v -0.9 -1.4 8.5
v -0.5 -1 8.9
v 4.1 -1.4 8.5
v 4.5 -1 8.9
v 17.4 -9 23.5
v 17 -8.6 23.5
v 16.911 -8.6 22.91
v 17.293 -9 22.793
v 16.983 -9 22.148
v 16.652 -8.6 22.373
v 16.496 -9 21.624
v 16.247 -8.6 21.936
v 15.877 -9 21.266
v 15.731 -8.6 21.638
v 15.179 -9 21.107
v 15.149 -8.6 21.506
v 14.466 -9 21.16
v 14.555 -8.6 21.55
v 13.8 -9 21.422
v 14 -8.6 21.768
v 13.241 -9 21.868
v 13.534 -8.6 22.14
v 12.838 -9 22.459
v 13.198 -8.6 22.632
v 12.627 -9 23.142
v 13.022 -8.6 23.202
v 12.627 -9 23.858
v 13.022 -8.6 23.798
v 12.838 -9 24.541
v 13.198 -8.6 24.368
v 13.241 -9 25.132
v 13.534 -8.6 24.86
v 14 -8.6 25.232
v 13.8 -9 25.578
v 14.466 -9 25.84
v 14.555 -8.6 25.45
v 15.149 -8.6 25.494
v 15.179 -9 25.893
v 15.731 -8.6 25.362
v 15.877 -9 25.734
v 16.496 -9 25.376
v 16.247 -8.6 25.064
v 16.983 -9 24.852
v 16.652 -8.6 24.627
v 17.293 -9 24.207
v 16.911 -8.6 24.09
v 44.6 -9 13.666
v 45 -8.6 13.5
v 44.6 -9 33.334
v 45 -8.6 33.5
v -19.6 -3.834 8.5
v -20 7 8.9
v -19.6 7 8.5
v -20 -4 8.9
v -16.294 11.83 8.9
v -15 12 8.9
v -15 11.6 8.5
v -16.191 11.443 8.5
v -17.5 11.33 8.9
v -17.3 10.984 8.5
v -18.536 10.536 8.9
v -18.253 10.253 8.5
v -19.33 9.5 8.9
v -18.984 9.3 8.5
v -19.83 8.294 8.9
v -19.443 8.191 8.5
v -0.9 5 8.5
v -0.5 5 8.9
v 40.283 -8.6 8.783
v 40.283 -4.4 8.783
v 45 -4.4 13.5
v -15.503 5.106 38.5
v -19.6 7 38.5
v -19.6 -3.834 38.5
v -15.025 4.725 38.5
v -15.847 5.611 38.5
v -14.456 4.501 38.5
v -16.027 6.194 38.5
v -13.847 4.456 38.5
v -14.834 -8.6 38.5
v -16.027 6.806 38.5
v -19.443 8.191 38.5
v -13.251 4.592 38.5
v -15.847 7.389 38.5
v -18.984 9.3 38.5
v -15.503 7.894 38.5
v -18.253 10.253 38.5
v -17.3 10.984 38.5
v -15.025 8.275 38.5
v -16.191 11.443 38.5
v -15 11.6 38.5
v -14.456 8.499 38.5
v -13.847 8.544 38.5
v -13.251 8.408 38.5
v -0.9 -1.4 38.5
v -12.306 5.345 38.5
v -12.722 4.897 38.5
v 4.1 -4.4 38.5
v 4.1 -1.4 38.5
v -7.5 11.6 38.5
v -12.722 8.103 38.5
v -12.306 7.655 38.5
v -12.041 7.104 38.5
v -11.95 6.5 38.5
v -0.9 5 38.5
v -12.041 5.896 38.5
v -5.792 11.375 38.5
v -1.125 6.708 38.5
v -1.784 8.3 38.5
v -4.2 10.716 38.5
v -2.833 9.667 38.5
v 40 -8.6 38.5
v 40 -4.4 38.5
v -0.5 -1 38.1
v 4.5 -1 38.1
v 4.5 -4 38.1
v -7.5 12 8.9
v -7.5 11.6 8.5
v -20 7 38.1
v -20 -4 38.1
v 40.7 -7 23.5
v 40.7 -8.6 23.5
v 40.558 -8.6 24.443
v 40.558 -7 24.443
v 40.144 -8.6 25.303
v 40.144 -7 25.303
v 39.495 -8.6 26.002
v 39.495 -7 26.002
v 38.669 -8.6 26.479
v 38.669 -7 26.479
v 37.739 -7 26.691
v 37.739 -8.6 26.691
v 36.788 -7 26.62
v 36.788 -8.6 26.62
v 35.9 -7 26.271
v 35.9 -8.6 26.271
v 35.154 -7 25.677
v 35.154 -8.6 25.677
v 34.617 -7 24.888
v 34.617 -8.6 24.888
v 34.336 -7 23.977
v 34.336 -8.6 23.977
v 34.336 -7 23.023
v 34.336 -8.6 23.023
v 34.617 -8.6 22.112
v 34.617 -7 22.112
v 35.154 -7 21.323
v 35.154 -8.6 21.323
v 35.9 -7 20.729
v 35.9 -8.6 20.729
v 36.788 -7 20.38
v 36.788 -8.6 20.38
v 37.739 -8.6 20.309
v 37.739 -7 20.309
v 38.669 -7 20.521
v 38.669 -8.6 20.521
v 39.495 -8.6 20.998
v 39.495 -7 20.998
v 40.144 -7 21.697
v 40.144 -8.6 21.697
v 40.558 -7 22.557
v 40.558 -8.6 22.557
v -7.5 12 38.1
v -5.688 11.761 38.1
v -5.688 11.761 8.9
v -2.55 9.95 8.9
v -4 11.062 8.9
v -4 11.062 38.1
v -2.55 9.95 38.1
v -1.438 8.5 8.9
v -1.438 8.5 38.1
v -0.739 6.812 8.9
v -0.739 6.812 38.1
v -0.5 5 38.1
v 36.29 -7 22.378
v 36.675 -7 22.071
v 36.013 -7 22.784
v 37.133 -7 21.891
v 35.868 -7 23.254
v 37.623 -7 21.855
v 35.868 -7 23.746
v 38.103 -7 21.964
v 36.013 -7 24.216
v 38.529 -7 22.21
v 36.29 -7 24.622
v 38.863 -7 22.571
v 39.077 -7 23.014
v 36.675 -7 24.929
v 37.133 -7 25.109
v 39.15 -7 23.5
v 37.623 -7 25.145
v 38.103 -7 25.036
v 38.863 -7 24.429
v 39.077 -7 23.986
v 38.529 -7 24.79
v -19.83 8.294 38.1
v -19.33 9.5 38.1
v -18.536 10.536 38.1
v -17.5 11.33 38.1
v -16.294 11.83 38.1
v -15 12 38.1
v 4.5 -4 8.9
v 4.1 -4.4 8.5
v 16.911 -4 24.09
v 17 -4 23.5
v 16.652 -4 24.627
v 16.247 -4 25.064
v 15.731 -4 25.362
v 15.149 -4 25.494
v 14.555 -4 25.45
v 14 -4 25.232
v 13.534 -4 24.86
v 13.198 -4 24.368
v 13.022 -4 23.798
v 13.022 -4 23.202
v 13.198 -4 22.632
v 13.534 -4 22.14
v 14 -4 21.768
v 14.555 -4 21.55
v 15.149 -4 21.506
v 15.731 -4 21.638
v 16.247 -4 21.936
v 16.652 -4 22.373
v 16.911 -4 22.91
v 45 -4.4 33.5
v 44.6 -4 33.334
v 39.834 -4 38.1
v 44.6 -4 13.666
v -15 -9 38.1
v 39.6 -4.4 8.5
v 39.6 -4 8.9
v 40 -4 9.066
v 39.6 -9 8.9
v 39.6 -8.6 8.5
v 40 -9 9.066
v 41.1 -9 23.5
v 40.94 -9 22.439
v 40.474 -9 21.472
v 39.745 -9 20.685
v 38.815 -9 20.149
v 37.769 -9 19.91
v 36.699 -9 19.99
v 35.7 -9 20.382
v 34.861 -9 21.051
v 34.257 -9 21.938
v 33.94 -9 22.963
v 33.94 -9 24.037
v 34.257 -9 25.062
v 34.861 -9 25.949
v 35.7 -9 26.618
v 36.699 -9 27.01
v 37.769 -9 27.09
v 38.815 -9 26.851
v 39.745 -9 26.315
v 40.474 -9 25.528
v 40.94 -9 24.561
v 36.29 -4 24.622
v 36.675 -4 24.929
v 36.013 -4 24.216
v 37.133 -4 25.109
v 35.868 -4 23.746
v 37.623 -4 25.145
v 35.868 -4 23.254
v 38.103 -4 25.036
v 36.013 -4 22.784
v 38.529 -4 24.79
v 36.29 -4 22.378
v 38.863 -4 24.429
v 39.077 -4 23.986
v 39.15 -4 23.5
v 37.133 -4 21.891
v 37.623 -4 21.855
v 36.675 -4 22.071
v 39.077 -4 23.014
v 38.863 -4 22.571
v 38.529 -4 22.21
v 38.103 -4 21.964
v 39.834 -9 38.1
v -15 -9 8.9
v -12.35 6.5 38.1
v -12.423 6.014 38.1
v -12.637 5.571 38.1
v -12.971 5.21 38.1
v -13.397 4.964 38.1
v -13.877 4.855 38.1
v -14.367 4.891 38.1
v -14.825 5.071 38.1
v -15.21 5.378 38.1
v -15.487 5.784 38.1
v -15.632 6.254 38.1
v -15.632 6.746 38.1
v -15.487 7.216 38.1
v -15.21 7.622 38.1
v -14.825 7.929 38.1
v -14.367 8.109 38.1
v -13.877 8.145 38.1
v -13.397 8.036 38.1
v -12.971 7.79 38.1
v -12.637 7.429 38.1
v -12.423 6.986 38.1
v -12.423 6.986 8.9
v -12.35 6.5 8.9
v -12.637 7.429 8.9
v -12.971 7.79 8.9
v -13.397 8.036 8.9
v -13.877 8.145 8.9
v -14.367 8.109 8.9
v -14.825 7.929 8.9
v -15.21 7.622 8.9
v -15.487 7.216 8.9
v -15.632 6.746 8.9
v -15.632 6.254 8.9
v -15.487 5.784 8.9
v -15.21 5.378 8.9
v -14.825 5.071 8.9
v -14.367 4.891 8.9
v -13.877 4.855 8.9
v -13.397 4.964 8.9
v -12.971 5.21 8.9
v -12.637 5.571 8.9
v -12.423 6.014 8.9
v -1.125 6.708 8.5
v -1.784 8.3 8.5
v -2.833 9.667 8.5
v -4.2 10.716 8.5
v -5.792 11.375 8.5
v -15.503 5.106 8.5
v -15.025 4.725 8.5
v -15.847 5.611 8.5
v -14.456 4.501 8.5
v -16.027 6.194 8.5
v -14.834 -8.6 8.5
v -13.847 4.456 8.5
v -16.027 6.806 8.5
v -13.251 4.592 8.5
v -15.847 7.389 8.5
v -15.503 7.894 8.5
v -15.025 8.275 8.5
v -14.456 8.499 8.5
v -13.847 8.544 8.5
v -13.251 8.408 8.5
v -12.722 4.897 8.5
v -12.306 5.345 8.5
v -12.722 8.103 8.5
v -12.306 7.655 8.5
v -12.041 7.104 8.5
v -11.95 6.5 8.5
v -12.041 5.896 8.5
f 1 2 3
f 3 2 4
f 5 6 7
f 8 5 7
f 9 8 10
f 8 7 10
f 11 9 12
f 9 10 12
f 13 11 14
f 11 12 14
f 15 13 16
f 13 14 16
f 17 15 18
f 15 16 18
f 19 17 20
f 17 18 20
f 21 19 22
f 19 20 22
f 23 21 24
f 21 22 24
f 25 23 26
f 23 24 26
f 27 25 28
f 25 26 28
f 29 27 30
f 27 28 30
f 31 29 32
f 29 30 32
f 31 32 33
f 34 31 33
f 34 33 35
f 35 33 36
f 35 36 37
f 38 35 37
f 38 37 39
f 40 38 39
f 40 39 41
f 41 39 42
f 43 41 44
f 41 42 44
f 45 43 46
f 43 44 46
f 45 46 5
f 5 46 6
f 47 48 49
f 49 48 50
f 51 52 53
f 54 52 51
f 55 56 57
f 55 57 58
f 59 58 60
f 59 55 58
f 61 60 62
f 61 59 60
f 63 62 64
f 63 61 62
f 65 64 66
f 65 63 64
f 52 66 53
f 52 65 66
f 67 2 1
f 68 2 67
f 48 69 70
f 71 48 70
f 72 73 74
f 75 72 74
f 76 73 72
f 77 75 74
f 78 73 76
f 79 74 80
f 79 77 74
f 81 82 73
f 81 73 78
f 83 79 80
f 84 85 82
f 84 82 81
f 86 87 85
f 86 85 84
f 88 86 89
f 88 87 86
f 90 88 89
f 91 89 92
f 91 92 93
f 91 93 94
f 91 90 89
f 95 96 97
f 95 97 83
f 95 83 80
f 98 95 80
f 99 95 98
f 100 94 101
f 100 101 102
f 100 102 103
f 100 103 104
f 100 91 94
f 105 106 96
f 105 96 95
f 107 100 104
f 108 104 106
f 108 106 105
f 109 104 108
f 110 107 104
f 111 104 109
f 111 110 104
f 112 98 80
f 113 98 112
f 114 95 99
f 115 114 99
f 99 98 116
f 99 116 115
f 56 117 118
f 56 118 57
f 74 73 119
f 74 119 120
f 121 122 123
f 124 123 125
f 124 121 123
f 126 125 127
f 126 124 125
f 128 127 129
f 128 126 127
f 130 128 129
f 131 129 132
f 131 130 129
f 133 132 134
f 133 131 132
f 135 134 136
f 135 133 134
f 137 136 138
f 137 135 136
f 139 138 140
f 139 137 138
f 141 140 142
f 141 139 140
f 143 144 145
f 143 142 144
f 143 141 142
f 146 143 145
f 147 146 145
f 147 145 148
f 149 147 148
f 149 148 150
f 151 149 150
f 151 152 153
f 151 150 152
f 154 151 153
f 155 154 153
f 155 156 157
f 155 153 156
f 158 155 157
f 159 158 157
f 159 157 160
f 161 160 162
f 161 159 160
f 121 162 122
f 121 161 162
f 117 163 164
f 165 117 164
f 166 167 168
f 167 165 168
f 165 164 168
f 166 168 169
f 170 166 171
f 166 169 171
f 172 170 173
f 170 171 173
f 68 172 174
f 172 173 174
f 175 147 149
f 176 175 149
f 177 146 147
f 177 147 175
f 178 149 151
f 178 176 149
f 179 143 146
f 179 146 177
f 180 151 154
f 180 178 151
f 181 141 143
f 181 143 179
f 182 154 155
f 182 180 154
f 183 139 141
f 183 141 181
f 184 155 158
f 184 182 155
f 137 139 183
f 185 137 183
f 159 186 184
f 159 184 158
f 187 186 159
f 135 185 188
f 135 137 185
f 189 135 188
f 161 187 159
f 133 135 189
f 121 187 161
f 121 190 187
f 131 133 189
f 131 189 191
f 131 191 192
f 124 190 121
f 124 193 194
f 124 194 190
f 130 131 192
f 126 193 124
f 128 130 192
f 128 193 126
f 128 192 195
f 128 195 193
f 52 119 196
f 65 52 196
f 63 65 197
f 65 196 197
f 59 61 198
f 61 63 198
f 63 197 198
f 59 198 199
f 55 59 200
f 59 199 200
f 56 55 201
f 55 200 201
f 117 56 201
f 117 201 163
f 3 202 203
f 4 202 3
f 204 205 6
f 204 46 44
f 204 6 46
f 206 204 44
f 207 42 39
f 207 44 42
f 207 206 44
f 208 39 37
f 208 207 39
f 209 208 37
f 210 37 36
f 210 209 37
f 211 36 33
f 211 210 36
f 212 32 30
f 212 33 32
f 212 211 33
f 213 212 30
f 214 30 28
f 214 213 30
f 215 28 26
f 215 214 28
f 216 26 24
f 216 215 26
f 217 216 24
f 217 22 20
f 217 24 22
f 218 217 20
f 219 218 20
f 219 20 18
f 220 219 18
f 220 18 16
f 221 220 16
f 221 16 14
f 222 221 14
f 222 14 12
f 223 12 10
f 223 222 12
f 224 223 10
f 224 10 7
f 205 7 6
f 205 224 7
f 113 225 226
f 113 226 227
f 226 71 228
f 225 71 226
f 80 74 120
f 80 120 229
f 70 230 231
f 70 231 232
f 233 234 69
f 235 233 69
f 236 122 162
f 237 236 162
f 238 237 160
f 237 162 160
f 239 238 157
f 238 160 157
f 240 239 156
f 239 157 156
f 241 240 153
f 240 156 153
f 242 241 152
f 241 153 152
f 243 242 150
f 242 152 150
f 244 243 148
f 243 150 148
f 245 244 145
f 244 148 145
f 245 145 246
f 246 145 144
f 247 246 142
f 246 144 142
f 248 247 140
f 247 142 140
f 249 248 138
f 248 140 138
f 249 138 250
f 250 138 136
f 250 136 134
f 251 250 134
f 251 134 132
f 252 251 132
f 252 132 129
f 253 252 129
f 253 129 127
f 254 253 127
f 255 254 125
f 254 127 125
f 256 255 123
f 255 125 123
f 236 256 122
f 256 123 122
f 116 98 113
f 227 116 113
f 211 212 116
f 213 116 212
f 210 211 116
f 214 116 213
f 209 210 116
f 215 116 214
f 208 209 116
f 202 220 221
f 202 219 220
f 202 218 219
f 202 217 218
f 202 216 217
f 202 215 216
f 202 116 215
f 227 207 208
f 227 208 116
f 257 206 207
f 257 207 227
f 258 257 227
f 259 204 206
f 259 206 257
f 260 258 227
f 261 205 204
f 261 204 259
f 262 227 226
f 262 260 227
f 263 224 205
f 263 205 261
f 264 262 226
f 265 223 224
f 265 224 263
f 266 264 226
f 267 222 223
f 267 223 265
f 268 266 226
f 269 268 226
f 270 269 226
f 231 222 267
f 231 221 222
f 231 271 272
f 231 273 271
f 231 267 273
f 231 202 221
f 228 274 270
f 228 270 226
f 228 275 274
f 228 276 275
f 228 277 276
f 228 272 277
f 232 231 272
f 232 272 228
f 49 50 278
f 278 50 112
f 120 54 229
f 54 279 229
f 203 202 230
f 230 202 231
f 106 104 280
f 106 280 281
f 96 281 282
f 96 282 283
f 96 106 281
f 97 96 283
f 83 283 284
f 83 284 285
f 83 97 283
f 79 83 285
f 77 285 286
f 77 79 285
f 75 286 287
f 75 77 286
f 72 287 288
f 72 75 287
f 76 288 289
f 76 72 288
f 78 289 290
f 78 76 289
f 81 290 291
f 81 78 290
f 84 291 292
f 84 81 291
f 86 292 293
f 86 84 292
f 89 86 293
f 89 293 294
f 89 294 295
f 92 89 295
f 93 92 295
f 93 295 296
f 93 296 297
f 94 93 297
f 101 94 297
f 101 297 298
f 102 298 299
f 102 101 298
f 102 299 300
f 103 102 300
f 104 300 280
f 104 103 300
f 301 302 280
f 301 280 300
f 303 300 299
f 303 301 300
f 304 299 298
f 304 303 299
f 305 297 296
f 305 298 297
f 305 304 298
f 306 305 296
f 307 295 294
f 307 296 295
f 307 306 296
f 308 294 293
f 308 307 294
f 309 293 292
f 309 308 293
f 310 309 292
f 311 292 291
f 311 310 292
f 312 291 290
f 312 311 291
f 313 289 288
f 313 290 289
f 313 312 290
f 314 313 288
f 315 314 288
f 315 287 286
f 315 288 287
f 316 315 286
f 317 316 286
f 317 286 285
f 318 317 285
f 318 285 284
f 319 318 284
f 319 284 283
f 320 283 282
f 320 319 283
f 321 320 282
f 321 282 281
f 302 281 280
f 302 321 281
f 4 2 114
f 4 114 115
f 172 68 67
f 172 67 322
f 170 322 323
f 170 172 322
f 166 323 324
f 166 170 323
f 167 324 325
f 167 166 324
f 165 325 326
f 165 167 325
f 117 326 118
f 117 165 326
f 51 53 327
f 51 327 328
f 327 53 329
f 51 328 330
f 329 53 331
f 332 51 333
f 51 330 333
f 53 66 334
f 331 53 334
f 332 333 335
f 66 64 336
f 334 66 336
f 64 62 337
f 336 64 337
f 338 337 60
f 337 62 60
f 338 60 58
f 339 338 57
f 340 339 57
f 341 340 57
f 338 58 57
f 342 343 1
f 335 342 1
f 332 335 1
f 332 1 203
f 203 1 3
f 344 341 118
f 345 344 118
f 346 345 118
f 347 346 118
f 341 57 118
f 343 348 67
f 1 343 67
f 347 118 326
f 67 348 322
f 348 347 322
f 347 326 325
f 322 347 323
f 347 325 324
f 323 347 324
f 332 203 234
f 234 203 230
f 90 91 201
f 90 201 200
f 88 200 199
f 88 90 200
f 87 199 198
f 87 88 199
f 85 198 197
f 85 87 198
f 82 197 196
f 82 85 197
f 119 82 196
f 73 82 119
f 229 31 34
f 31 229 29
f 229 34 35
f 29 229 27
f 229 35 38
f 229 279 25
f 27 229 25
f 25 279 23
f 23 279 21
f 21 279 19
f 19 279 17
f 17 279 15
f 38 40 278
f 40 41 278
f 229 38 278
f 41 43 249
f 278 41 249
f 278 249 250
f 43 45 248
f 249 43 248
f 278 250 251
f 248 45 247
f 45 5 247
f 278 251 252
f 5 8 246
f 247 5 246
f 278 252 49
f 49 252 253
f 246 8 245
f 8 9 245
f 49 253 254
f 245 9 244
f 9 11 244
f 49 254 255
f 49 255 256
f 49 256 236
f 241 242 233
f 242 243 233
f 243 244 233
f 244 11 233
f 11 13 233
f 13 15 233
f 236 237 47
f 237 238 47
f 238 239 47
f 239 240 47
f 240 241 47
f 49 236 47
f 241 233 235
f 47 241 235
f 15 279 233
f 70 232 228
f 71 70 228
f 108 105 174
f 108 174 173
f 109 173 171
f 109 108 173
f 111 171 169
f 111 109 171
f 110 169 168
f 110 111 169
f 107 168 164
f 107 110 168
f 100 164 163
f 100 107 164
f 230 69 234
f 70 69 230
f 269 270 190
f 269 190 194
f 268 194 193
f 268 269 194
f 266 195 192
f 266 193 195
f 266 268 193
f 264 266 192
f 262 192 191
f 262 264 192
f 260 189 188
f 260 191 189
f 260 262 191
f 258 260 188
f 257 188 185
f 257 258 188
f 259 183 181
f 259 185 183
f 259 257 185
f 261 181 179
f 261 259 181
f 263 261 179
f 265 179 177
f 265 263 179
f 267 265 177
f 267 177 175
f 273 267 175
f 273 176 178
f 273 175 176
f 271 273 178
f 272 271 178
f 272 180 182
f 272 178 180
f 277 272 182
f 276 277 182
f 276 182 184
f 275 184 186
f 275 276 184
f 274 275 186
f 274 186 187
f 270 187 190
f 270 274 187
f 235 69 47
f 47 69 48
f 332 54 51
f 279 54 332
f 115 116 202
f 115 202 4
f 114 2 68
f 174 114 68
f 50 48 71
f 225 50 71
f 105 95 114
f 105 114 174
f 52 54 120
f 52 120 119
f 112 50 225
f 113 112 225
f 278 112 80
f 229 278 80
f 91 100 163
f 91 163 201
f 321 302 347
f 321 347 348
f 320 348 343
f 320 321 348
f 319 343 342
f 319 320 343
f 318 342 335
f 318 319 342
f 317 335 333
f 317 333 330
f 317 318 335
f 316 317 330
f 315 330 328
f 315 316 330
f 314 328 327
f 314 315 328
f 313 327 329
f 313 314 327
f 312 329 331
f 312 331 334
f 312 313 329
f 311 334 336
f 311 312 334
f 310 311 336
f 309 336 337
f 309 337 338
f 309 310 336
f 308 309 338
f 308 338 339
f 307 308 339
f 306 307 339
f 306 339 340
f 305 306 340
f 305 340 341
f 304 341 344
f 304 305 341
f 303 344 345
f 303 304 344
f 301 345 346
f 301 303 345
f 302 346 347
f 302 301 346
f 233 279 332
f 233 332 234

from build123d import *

# Parameters (mm, degrees)
CYLINDER008_R      = 1.65
CYLINDER008_DEPTH  = 10
CYLINDER009_R      = 3.2
CYLINDER009_DEPTH  = 10
CYLINDER007_R      = 2
CYLINDER007_DEPTH  = 10
CYLINDER006_R      = 1.65
CYLINDER006_DEPTH  = 50
BOX014_W           = 5
BOX014_H           = 3
BOX014_DEPTH       = 30
BOX012_W           = 19.5
BOX012_H           = 21
BOX012_DEPTH       = 30
BOX011_W           = 59
BOX011_H           = 5
BOX011_DEPTH       = 30
FILLET001_R        = 5
FILLET002_R        = 7
CHAMFER006004_SIZE = 5
CHAMFER006005_SIZE = 5
CHAMFER006006_SIZE = 0.4


with BuildPart() as cylinder008:
    # Cylinder008 → Cylinder008 (new body)
    with BuildSketch(Plane(origin=(37.5, 0, 23.5), x_dir=(1, 0, 0), z_dir=(0, -1, 0))):
        Circle(CYLINDER008_R)
    extrude(amount=CYLINDER008_DEPTH)


with BuildPart() as fusion004:
    # Cylinder009 → Cylinder009 (new body)
    with BuildSketch(Plane(origin=(37.5, -7, 23.5), x_dir=(1, 0, 0), z_dir=(0, -1, 0))):
        Circle(CYLINDER009_R)
    extrude(amount=CYLINDER009_DEPTH)

    # Fusion004: union Cylinder008
    add(cylinder008.part)


with BuildPart() as cylinder007:
    # Cylinder007 → Cylinder007 (new body)
    with BuildSketch(Plane(origin=(15, 0, 23.5), x_dir=(1, 0, 0), z_dir=(0, -1, 0))):
        Circle(CYLINDER007_R)
    extrude(amount=CYLINDER007_DEPTH)


with BuildPart() as cylinder006:
    # Cylinder006 → Cylinder006 (new body)
    with BuildSketch(Plane(origin=(-14, 6.5, -4), x_dir=(1, 0, 0), z_dir=(0, 0, 1))):
        Circle(CYLINDER006_R)
    extrude(amount=CYLINDER006_DEPTH)


with BuildPart() as cube013:
    # Box014 → Box014 (new body)
    with BuildSketch(Plane(origin=(-0.5, -4, 8.5), x_dir=(1, 0, 0), z_dir=(0, 0, 1))):
        with Locations((2.5, 1.5)):
            Rectangle(BOX014_W, BOX014_H)
    extrude(amount=BOX014_DEPTH)


with BuildPart() as cube012:
    # Box012 → Box012 (new body)
    with BuildSketch(Plane(origin=(-20, -9, 8.5), x_dir=(1, 0, 0), z_dir=(0, 0, 1))):
        with Locations((9.75, 10.5)):
            Rectangle(BOX012_W, BOX012_H)
    extrude(amount=BOX012_DEPTH)


with BuildPart() as chamfer006006:
    # Box011 → Box011 (new body)
    with BuildSketch(Plane(origin=(-14, -9, 8.5), x_dir=(1, 0, 0), z_dir=(0, 0, 1))):
        with Locations((29.5, 2.5)):
            Rectangle(BOX011_W, BOX011_H)
    extrude(amount=BOX011_DEPTH)

    # Fusion003: union Cube013, Cube012
    add(cube013.part)
    add(cube012.part)

    # Cut010011008009003016026008003006: cut Cylinder006
    add(cylinder006.part, mode=Mode.SUBTRACT)

    # Fillet001
    fillet001_edges = [chamfer006006.edges().sort_by_distance(p)[0] for p in [
        (-20, 12, 23.5),
    ]]
    fillet(fillet001_edges, radius=FILLET001_R)

    # Fillet002
    fillet002_edges = [chamfer006006.edges().sort_by_distance(p)[0] for p in [
        (-0.5, 12, 23.5),
    ]]
    fillet(fillet002_edges, radius=FILLET002_R)

    # Chamfer006004
    chamfer006004_edges = [chamfer006006.edges().sort_by_distance(p)[0] for p in [
        (-20, -9, 23.5),
    ]]
    chamfer(chamfer006004_edges, length=CHAMFER006004_SIZE)

    # Chamfer006005
    chamfer006005_edges = [chamfer006006.edges().sort_by_distance(p)[0] for p in [
        (45, -6.5, 8.5),
        (45, -6.5, 38.5),
    ]]
    chamfer(chamfer006005_edges, length=CHAMFER006005_SIZE)

    # Cut010011008009003016026008003007: cut Cylinder007
    add(cylinder007.part, mode=Mode.SUBTRACT)

    # Cut010011008009003016026008003008: cut Fusion004
    add(fusion004.part, mode=Mode.SUBTRACT)

    # Chamfer006006
    chamfer006006_edges = [chamfer006006.edges().sort_by_distance(p)[0] for p in [
        (34.3, -9, 23.5),
        (22.25, -4, 8.5),
        (42.5, -4, 11),
        (45, -4, 23.5),
        (22.25, -4, 38.5),
        (42.5, -4, 36),
        (42.5, -9, 11),
        (40, -6.5, 8.5),
        (4.5, -2.5, 38.5),
        (4.5, -2.5, 8.5),
        (45, -9, 23.5),
        (42.5, -9, 36),
        (13, -9, 23.5),
        (2, -1, 8.5),
        (2, -1, 38.5),
        (-0.5, 2, 38.5),
        (-0.5, 2, 8.5),
        (-2.550253, 9.949747, 8.5),
        (-2.550253, 9.949747, 38.5),
        (-11.25, 12, 8.5),
        (-11.25, 12, 38.5),
        (-18.535534, 10.535534, 8.5),
        (-18.535534, 10.535534, 38.5),
        (-20, 1.5, 38.5),
        (-20, 1.5, 8.5),
        (-17.5, -6.5, 8.5),
        (-17.5, -6.5, 38.5),
        (12.5, -9, 8.5),
        (-15.65, 6.5, 8.5),
        (-15.65, 6.5, 38.5),
        (12.5, -9, 38.5),
    ]]
    chamfer(chamfer006006_edges, length=CHAMFER006006_SIZE)


solid = chamfer006006.part
